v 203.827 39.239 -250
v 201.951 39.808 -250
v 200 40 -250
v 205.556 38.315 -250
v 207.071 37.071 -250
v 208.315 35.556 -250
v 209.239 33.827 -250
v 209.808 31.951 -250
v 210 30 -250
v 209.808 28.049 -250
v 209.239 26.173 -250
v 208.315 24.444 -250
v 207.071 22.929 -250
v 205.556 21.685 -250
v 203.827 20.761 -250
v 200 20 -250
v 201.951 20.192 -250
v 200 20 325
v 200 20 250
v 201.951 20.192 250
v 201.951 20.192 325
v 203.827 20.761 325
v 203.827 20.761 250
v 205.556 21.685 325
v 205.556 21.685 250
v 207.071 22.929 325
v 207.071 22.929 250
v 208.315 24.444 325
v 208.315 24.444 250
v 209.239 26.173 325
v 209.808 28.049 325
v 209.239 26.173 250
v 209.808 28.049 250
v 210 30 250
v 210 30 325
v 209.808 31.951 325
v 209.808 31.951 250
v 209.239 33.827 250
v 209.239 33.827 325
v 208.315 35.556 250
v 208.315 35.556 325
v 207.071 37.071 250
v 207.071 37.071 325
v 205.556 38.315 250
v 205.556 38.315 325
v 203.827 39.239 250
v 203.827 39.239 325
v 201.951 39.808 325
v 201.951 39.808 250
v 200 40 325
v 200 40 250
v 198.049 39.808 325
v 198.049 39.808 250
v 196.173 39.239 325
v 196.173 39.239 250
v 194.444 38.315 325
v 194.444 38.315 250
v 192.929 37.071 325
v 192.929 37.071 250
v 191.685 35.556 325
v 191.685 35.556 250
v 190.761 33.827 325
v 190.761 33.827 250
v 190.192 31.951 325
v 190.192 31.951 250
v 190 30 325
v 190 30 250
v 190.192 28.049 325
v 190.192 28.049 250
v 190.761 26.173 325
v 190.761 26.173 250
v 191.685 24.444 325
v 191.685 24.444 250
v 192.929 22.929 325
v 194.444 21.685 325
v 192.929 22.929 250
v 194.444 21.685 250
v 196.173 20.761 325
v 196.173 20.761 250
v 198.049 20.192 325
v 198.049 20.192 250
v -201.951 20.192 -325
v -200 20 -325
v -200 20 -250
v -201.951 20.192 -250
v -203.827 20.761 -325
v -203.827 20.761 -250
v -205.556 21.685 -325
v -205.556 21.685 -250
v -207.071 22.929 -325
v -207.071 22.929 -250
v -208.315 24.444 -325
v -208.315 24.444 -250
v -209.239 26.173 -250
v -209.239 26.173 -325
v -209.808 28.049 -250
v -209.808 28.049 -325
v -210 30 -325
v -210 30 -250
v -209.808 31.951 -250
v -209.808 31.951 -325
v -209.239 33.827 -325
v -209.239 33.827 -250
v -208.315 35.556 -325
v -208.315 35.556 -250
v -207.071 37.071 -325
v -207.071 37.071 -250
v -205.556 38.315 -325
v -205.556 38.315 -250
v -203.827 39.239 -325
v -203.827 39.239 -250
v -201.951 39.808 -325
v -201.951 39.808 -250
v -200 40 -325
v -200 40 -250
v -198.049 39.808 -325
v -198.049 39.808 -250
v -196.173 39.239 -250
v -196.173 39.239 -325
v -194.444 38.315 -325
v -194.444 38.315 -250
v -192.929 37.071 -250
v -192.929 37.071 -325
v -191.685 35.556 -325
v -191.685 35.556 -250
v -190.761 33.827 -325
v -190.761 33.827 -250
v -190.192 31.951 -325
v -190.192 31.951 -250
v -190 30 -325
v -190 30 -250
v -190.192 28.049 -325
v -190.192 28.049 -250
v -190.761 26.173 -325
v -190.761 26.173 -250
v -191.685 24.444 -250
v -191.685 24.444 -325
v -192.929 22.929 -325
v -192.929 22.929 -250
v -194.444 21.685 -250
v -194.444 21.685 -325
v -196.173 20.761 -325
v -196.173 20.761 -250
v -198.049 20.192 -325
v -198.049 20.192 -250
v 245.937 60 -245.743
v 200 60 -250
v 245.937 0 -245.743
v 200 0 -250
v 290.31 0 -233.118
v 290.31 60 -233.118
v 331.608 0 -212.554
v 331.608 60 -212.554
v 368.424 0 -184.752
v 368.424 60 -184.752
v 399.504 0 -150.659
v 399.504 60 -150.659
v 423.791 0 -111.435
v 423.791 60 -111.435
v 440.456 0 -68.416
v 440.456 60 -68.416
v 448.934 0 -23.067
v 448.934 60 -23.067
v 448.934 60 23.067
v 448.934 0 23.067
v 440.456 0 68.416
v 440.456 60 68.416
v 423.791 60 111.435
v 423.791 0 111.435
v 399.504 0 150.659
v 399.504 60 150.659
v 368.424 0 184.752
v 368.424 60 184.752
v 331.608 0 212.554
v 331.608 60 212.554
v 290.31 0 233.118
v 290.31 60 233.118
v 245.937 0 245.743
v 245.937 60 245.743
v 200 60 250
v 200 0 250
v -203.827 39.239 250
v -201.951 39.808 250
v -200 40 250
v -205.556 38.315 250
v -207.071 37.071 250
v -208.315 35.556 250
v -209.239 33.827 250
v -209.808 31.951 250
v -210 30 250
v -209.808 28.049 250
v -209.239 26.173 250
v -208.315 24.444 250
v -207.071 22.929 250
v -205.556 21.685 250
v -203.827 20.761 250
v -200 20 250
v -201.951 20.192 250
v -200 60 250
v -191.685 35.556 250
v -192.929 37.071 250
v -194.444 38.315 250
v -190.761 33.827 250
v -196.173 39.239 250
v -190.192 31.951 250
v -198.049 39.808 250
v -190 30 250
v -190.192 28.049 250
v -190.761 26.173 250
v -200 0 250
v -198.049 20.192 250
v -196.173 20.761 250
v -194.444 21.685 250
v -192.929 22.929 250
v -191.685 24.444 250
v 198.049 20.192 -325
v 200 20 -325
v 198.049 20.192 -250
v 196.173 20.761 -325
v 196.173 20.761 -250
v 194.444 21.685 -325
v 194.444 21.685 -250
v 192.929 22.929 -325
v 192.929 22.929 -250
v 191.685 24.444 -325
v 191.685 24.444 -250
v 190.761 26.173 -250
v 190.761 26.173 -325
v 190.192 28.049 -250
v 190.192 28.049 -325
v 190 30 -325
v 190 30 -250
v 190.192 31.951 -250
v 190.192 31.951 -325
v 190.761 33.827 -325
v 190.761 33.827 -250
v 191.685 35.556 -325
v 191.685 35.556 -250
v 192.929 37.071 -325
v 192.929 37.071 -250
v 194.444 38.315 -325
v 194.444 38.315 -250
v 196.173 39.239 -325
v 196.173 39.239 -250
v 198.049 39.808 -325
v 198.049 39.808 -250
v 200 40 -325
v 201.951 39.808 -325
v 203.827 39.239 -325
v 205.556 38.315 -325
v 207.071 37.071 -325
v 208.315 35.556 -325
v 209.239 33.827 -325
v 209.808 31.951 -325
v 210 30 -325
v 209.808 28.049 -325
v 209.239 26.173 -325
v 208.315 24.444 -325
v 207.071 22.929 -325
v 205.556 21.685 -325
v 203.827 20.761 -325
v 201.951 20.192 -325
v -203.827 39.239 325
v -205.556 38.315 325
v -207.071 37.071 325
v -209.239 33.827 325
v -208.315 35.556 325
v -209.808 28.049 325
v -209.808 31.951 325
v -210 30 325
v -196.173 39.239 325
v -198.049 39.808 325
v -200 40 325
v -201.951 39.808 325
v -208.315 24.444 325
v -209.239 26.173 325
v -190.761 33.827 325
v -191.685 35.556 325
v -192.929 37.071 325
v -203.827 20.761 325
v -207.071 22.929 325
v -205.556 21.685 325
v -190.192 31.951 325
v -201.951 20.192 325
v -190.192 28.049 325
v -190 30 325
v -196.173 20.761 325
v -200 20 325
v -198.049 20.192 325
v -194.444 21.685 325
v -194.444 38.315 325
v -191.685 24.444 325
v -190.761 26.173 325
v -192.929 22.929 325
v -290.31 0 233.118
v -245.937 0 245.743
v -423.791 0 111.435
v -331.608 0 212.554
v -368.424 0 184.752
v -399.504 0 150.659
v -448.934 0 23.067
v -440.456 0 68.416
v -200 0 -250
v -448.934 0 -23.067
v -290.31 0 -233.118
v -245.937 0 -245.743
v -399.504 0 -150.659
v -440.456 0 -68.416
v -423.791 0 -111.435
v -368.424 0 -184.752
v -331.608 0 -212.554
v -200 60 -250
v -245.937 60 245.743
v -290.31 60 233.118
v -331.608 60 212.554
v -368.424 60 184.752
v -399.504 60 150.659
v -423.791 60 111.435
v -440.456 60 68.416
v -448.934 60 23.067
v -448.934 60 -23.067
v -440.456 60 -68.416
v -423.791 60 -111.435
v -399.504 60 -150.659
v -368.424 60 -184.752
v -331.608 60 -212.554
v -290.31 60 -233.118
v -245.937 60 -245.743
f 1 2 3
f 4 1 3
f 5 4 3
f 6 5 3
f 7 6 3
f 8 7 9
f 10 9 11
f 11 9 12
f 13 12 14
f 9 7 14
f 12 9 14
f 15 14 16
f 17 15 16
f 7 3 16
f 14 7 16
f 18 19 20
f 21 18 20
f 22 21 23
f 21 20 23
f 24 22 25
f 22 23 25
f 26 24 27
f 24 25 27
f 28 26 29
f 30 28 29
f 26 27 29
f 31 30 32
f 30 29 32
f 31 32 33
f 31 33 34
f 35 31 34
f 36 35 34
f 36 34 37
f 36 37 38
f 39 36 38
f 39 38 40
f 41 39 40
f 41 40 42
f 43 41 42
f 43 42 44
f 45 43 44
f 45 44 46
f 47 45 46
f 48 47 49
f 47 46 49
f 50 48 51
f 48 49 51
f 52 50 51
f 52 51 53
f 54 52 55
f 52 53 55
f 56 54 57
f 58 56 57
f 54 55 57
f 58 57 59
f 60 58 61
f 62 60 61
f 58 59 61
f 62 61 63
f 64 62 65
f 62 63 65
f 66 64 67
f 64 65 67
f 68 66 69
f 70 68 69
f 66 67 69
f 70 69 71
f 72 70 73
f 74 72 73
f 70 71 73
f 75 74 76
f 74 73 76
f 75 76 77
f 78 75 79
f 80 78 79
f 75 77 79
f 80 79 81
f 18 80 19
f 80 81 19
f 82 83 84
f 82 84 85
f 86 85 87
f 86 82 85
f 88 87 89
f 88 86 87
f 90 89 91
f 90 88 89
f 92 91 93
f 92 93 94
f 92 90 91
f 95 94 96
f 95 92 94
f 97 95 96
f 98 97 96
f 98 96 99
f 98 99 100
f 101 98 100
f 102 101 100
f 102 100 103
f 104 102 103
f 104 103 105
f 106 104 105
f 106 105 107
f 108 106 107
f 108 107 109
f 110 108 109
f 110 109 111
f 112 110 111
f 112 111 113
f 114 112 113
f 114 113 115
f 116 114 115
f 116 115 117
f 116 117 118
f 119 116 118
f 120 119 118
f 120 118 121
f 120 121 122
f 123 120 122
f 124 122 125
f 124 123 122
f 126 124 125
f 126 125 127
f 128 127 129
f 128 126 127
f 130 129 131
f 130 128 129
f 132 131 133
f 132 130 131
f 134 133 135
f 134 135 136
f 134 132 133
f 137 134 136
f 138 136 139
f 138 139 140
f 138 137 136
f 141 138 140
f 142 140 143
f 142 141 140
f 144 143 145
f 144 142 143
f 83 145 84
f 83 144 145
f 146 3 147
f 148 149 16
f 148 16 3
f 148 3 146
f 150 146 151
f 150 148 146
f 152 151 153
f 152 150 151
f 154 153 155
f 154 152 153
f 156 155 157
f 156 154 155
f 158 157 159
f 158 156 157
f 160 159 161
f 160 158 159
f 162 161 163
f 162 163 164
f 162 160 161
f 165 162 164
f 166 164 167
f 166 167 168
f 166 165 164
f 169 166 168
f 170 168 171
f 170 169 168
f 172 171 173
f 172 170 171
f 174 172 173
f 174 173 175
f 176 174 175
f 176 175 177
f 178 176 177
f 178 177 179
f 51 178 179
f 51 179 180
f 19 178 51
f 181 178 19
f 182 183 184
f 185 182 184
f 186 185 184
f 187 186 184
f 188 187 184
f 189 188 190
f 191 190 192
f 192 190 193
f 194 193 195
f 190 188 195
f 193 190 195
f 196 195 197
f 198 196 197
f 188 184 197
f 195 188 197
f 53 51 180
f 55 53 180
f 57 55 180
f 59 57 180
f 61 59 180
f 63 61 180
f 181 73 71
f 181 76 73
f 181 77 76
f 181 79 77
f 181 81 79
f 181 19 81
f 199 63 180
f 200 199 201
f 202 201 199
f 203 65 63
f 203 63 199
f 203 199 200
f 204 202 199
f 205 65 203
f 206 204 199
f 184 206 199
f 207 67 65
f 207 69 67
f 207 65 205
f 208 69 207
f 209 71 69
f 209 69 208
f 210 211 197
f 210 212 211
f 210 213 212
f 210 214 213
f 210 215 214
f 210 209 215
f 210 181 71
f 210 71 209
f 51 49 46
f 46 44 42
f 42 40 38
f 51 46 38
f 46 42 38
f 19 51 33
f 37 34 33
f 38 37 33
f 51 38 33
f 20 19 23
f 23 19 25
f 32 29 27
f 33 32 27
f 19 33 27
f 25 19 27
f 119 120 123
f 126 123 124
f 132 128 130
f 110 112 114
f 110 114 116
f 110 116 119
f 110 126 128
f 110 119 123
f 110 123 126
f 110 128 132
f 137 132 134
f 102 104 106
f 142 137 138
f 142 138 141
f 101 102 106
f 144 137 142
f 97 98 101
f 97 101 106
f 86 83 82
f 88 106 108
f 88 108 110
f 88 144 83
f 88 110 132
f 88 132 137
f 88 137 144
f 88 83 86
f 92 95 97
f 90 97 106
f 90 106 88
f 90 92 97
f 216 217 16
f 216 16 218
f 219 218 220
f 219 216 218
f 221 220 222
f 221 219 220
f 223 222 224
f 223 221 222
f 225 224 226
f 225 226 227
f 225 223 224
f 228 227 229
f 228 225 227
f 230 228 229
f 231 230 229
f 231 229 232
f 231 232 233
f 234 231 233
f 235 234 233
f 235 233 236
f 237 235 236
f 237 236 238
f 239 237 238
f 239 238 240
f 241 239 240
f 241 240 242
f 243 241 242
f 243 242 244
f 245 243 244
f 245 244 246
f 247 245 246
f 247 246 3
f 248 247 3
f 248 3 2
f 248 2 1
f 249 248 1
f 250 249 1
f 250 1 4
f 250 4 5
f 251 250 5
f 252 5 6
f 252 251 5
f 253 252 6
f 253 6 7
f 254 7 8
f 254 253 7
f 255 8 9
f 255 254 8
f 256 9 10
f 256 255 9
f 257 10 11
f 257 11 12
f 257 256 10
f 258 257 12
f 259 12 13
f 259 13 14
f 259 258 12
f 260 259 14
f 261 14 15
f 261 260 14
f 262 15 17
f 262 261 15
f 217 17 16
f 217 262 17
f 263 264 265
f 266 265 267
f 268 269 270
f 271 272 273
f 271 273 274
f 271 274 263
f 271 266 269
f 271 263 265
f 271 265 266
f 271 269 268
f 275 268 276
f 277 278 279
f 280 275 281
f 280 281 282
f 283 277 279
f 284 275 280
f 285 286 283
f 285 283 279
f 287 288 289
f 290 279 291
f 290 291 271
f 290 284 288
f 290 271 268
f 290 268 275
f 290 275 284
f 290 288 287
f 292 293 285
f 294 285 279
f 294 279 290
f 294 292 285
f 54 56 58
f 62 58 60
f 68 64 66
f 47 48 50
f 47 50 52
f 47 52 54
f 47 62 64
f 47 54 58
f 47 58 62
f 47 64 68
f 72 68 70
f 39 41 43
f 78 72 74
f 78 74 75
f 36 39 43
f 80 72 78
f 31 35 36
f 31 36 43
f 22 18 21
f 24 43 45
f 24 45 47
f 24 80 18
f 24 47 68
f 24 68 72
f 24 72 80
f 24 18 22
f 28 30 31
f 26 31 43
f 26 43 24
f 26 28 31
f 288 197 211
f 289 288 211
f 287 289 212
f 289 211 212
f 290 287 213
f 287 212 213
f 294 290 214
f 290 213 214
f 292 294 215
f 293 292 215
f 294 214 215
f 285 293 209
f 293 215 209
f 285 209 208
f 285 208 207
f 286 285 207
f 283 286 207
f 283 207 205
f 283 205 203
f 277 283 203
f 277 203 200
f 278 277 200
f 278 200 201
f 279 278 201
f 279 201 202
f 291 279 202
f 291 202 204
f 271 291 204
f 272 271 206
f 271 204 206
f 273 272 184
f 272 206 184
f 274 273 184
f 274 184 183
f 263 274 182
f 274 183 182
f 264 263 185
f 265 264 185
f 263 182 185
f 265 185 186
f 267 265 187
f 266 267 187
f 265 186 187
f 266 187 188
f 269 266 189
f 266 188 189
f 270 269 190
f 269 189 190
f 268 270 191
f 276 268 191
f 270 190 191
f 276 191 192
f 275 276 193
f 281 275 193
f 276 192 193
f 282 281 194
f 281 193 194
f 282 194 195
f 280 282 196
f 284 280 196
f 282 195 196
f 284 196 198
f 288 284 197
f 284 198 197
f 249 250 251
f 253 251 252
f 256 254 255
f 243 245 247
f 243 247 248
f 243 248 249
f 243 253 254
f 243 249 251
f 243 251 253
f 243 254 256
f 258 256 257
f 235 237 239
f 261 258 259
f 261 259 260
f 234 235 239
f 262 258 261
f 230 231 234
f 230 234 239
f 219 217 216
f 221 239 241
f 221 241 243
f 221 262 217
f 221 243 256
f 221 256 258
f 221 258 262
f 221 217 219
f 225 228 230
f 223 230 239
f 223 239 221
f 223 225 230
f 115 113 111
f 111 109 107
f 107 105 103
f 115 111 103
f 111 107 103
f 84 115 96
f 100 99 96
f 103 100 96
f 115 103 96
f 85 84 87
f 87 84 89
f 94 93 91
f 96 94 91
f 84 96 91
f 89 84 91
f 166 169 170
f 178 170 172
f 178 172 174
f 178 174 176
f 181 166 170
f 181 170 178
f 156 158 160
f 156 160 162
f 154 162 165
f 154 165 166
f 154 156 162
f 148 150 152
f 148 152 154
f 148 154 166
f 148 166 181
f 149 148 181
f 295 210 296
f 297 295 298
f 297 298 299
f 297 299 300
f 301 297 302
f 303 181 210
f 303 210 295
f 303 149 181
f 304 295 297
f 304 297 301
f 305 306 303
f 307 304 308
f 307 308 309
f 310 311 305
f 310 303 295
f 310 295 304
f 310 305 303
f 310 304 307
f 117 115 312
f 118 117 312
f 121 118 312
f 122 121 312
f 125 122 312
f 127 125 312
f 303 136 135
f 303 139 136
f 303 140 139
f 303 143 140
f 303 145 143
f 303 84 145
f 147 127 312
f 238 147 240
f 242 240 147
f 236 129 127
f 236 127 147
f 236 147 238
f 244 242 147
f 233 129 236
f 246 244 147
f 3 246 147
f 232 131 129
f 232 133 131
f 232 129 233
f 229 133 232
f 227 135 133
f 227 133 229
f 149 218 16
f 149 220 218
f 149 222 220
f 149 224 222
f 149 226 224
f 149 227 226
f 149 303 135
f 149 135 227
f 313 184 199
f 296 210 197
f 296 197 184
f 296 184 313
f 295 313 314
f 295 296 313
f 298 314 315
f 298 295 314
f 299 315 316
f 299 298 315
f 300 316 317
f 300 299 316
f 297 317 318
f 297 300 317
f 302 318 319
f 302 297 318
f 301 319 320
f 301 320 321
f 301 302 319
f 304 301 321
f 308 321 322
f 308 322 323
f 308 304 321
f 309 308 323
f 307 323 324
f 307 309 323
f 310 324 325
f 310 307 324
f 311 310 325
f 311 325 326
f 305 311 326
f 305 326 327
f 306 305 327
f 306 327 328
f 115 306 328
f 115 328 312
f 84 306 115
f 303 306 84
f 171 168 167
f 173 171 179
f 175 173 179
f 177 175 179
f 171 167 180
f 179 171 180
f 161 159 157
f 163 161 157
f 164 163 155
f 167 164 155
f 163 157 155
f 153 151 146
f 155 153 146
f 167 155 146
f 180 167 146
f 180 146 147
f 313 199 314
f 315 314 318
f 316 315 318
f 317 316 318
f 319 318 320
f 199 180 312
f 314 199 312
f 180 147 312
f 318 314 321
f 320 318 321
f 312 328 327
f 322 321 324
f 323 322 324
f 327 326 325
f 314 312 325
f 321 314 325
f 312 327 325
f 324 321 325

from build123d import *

# Parameters (mm, degrees)
BOSS_EXTRUDE2_DEPTH = 60
SKETCH4_R           = 10
BOSS_EXTRUDE3_DEPTH = 75
BOSS_EXTRUDE4_START = 75
SKETCH5_R           = 10
BOSS_EXTRUDE4_DEPTH = 75


with BuildPart() as part:
    # Sketch3 → Boss-Extrude2 (new body)
    with BuildSketch(Plane(origin=(0, 0, 0), x_dir=(1, 0, 0), z_dir=(0, 1, 0))):
        with BuildLine():
            Line((-200, 250), (200, 250))
            ThreePointArc((200, 250), (450, 0), (200, -250))
            Line((200, -250), (-200, -250))
            ThreePointArc((-200, -250), (-450, 0), (-200, 250))
        make_face()
    extrude(amount=BOSS_EXTRUDE2_DEPTH)

    # Sketch4 → Boss-Extrude3 (add)
    with BuildSketch(Plane.XY.offset(250)):
        with Locations(Location((-200, 30, 0), (0, 0, 270))):
            Circle(SKETCH4_R)
        with Locations(Location((200, 30, 0), (0, 0, 270))):
            Circle(SKETCH4_R)
    extrude(amount=BOSS_EXTRUDE3_DEPTH)

    # Sketch5 → Boss-Extrude4 (add)
    with BuildSketch(Plane(origin=(0, 0, -250), x_dir=(-1, 0, 0), z_dir=(0, 0, -1)).offset(BOSS_EXTRUDE4_START)):
        with Locations(Location((-200, 30, 0), (0, 0, 270))):
            Circle(SKETCH5_R)
        with Locations(Location((200, 30, 0), (0, 0, 270))):
            Circle(SKETCH5_R)
    extrude(amount=-BOSS_EXTRUDE4_DEPTH)


solid = part.part
